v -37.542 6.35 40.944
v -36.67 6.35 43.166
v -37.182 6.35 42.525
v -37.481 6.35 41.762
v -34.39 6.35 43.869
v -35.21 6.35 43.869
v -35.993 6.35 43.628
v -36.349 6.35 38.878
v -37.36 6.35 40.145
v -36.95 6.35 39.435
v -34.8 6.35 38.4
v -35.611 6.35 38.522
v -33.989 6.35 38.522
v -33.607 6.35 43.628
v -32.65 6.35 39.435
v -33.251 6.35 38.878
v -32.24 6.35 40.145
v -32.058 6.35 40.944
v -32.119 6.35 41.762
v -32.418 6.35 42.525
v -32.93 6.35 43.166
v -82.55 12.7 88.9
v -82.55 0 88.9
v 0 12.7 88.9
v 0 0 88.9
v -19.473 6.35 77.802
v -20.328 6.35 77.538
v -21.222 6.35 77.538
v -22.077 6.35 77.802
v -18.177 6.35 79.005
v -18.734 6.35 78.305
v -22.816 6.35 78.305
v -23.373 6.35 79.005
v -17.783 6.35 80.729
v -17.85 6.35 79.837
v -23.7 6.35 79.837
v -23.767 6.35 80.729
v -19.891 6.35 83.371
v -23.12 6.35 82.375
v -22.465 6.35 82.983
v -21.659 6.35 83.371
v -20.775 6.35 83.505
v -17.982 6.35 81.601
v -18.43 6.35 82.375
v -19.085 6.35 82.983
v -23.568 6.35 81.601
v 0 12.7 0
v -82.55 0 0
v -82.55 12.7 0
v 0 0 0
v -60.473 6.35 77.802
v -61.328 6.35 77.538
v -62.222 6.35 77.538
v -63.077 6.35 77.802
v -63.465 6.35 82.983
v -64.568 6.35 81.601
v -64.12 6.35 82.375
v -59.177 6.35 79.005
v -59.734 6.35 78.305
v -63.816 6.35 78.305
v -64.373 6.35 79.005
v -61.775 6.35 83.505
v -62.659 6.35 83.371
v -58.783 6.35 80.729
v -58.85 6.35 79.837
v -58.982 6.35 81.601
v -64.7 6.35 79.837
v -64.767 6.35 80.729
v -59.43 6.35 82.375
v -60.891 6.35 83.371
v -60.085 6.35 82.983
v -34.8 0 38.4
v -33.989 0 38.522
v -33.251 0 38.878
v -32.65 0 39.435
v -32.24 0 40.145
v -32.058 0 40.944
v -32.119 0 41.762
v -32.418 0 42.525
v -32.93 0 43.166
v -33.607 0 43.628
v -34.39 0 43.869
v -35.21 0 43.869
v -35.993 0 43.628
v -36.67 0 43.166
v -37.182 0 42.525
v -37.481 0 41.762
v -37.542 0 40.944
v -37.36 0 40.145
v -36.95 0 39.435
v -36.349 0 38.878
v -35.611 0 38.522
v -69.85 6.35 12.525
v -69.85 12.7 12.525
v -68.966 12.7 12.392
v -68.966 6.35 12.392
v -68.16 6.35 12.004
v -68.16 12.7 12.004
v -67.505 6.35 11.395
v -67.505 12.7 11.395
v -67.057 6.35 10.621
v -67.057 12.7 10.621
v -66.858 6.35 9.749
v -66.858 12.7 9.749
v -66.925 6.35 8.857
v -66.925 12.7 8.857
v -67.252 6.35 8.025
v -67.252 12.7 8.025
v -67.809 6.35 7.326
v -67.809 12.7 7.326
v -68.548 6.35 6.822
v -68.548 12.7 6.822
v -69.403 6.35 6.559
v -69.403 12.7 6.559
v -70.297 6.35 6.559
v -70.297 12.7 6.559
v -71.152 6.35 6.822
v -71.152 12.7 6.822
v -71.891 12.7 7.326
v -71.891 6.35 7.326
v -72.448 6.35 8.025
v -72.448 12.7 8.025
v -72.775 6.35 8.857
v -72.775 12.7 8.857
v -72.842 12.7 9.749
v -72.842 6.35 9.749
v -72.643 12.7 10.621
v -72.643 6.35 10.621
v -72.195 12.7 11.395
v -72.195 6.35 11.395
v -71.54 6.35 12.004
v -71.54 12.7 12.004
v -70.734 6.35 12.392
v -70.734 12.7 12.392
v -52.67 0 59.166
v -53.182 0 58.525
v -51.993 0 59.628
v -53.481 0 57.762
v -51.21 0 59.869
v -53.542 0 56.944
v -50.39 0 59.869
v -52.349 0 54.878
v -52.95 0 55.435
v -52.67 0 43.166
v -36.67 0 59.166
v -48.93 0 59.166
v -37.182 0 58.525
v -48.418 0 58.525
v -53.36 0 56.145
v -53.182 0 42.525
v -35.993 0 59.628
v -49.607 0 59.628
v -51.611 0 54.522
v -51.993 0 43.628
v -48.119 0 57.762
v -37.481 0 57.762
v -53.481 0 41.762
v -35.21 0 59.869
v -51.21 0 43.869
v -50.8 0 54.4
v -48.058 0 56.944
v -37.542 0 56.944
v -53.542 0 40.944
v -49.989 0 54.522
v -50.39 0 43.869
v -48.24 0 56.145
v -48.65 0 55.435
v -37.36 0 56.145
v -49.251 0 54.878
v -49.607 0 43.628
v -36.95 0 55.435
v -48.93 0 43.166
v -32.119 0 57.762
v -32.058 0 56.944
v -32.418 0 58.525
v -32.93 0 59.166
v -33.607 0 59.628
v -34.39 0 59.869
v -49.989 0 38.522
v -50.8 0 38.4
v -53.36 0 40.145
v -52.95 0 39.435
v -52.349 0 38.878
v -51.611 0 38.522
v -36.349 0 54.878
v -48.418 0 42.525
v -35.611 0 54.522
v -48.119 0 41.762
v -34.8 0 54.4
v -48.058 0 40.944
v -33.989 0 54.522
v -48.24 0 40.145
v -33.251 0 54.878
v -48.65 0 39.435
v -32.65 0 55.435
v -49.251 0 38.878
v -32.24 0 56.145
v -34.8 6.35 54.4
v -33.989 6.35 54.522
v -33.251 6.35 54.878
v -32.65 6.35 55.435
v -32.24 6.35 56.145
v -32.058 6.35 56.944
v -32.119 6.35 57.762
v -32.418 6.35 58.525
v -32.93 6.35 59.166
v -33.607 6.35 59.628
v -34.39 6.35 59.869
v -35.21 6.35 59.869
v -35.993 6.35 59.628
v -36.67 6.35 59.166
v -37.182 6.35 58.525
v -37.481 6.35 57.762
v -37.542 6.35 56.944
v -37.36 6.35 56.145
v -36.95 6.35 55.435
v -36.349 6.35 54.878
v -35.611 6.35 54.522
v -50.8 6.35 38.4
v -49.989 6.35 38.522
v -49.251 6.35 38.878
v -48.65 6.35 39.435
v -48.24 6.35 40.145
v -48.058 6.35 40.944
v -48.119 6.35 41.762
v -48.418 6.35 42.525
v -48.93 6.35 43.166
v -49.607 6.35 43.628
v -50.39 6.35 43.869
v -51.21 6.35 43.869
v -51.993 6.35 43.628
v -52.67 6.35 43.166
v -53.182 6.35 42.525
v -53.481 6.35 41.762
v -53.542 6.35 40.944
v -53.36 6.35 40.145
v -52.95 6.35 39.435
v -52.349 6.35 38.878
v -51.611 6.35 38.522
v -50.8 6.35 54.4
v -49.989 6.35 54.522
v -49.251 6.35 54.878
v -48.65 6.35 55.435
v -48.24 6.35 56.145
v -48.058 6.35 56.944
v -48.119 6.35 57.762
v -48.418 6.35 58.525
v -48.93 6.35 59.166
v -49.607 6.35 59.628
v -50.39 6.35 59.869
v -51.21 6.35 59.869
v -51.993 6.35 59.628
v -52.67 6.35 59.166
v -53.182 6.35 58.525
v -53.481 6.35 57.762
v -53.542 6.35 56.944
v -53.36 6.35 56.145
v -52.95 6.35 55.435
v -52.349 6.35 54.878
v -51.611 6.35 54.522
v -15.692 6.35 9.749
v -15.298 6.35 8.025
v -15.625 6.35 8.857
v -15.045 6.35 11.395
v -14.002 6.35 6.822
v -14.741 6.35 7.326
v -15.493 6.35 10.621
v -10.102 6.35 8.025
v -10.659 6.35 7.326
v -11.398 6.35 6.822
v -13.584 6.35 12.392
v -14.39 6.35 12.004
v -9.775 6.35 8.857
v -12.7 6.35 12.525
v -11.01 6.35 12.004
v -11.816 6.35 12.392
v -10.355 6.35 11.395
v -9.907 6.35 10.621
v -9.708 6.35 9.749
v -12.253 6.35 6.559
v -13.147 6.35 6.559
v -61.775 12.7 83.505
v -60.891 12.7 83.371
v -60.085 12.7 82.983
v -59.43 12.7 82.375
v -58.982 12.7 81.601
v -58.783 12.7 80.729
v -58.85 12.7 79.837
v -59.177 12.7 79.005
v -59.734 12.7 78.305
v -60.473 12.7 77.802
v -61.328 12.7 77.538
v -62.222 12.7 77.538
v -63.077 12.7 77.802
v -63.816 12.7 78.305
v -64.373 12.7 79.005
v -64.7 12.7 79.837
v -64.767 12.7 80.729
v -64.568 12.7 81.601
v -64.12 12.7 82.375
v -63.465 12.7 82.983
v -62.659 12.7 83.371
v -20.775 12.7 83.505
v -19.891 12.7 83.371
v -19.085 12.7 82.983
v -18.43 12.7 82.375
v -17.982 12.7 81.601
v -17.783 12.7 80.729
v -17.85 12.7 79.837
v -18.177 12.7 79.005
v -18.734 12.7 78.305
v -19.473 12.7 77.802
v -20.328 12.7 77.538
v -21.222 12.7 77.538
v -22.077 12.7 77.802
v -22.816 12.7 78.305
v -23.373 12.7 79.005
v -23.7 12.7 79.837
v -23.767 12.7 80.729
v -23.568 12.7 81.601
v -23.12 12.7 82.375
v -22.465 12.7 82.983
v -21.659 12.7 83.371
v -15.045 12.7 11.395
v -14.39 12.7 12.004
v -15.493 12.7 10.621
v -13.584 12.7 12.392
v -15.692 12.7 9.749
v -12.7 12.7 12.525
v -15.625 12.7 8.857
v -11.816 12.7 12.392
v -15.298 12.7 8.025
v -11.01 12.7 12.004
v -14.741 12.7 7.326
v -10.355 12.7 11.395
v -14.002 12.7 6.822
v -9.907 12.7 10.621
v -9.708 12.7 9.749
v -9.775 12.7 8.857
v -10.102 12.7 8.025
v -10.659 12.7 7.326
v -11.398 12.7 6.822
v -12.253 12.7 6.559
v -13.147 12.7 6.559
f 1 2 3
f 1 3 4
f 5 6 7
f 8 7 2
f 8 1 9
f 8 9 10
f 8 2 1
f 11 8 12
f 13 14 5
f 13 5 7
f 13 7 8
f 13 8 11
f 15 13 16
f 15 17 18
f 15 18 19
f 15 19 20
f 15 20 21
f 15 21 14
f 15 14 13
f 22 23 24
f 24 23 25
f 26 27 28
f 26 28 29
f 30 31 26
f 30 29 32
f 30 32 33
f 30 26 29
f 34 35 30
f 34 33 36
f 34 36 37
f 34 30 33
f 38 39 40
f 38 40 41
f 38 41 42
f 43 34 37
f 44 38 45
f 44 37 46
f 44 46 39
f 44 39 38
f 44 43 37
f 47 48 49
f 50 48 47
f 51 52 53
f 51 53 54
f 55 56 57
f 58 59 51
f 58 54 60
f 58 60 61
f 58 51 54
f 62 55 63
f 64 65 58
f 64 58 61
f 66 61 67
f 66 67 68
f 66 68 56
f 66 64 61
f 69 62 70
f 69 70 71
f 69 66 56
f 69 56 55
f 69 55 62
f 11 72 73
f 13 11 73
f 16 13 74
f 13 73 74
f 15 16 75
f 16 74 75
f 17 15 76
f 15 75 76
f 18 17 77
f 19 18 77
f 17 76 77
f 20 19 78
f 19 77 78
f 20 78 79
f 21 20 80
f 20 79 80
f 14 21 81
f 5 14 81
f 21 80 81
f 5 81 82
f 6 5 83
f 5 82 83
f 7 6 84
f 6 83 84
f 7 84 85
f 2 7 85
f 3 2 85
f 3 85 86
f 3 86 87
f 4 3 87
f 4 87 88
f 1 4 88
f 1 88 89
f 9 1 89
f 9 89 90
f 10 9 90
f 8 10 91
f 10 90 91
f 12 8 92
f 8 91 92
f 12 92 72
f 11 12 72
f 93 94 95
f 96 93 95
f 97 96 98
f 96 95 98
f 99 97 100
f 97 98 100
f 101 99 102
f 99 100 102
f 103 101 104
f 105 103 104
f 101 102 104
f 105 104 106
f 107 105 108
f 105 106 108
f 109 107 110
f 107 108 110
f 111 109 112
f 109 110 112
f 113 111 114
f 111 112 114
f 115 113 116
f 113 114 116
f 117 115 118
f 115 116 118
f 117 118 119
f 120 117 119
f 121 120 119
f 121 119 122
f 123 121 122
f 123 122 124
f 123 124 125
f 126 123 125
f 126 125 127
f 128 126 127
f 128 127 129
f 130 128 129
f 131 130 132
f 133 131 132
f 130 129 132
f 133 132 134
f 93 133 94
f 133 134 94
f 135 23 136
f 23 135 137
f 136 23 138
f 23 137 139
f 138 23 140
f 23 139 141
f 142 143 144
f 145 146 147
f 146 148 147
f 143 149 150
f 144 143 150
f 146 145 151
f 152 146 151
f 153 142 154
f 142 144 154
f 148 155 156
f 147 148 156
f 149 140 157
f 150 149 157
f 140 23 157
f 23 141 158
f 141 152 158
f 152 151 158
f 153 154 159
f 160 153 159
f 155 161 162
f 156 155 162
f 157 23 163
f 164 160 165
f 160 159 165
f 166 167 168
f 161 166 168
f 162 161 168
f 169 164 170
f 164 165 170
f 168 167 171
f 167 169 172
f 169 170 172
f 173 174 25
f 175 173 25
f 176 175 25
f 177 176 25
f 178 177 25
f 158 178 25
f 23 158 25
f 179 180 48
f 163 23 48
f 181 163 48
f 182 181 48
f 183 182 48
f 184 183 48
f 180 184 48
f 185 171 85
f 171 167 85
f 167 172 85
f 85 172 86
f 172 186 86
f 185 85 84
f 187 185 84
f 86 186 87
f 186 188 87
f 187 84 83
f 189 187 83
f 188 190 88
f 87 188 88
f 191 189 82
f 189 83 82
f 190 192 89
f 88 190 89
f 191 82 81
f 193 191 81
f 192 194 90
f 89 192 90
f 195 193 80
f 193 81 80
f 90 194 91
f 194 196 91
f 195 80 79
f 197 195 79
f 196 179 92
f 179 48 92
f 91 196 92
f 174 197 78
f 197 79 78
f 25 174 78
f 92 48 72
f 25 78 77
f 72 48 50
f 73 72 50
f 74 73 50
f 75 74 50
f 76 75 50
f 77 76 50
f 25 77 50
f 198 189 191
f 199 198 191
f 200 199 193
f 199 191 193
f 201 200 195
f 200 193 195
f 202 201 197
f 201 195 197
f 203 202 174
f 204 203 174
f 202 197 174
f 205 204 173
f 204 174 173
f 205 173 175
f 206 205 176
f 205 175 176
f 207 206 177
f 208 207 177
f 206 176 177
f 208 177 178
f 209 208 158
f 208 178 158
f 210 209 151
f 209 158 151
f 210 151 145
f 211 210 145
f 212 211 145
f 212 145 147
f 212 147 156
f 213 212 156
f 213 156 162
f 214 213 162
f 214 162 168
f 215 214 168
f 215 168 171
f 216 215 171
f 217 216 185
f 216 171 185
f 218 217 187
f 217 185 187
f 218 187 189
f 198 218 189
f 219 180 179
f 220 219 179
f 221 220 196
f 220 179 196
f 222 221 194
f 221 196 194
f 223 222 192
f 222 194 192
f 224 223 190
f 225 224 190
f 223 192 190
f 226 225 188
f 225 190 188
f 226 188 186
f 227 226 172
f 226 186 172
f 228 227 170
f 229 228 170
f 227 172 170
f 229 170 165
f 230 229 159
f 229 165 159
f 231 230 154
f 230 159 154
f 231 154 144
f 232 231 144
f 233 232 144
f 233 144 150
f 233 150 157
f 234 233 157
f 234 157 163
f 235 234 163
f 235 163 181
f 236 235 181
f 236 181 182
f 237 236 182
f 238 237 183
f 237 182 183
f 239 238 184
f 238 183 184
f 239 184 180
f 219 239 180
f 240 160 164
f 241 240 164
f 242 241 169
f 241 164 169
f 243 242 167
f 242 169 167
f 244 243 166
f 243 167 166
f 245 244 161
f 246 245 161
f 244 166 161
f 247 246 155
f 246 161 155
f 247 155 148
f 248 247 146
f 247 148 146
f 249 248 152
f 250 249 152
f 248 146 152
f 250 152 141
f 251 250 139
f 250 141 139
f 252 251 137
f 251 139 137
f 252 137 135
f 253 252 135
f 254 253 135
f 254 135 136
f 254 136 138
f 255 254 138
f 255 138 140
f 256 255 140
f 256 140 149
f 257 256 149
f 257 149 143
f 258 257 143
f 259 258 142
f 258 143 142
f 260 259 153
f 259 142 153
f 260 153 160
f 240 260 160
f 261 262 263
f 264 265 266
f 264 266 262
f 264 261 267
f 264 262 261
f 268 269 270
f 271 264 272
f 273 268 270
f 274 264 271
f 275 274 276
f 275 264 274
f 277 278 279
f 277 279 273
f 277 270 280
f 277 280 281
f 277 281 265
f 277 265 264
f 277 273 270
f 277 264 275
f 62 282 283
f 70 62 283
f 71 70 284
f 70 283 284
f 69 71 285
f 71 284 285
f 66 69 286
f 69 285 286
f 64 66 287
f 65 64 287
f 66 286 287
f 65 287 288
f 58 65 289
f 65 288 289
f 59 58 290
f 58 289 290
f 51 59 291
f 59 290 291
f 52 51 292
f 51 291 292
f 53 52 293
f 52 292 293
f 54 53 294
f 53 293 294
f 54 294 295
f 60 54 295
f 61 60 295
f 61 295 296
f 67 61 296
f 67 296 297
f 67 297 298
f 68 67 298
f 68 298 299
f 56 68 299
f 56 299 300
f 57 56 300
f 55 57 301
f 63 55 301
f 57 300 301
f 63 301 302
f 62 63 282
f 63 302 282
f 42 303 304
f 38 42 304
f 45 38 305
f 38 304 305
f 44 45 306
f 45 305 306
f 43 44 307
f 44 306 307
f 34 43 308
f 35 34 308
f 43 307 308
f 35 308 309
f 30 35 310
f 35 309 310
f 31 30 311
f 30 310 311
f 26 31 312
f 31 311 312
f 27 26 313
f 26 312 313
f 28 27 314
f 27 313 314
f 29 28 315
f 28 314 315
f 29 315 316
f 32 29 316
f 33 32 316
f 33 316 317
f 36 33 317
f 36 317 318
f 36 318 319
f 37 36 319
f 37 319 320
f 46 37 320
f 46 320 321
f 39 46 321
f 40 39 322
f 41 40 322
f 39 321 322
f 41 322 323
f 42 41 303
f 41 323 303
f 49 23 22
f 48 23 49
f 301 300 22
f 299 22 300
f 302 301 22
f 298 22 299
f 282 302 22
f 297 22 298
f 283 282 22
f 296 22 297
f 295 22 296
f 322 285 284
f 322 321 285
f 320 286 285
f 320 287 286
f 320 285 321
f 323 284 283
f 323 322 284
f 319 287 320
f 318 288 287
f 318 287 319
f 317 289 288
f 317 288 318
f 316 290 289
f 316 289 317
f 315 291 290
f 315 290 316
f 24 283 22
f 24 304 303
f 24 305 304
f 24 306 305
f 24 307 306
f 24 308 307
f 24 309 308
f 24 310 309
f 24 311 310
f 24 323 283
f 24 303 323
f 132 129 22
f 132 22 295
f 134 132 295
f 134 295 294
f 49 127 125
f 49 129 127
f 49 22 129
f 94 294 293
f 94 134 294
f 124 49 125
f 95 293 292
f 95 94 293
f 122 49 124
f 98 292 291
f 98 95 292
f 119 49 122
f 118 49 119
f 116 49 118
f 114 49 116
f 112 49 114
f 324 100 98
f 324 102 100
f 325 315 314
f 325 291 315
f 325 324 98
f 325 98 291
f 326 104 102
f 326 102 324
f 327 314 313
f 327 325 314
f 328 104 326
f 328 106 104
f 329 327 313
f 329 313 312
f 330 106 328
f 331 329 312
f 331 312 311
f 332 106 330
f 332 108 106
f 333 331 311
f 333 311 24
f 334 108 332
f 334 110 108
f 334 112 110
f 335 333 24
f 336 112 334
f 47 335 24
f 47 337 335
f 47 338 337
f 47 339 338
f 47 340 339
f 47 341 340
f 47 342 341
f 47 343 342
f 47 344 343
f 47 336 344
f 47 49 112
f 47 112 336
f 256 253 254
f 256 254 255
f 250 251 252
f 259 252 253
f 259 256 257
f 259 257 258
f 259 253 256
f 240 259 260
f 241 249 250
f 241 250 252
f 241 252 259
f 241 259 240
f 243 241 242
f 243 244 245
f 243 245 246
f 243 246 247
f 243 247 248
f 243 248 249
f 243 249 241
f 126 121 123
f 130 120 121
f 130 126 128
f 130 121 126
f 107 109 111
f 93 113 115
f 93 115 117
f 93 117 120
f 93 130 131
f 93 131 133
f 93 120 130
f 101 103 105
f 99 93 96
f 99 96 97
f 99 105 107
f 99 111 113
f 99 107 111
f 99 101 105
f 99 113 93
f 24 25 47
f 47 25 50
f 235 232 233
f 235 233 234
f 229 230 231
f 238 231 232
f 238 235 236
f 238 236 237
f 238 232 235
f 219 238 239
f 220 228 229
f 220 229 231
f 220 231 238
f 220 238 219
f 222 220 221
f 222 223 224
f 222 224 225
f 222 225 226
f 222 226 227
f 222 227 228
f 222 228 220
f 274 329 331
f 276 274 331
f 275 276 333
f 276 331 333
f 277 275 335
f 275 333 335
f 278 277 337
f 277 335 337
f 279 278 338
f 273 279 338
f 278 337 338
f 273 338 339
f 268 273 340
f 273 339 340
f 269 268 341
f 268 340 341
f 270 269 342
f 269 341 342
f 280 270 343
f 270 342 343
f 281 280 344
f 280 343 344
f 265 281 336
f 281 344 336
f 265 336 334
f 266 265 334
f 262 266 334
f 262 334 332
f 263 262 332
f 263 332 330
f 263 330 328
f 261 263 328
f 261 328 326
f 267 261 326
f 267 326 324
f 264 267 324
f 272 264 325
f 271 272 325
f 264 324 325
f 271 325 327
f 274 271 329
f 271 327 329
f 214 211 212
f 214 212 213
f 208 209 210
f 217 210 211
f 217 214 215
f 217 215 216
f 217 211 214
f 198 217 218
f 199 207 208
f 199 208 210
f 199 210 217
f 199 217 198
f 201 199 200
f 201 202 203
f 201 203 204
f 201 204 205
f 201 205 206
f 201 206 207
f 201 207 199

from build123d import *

# Parameters (mm, degrees)
SKETCH1_W           = 82.55
SKETCH1_H           = 88.9
BOSS_EXTRUDE1_DEPTH = 12.7
SKETCH2_R           = 3
CUT_EXTRUDE1_DEPTH  = 6.35
SKETCH3_R           = 2.75
CUT_EXTRUDE2_DEPTH  = 6.35


with BuildPart() as part:
    # Sketch1 → Boss-Extrude1 (new body)
    with BuildSketch(Plane(origin=(0, 0, 0), x_dir=(1, 0, 0), z_dir=(0, 1, 0))):
        with Locations((-41.275, -44.45)):
            Rectangle(SKETCH1_W, SKETCH1_H)
    extrude(amount=BOSS_EXTRUDE1_DEPTH)

    # Sketch2 → Cut-Extrude1 (cut)
    with BuildSketch(Plane(origin=(0, 12.7, 0), x_dir=(1, 0, 0), z_dir=(0, 1, 0))):
        with Locations((-69.85, -9.525)):
            Circle(SKETCH2_R)
        with Locations((-12.7, -9.525)):
            Circle(SKETCH2_R)
        with Locations((-61.775, -80.504650473)):
            Circle(SKETCH2_R)
        with Locations((-20.775, -80.504650473)):
            Circle(SKETCH2_R)
    extrude(amount=-CUT_EXTRUDE1_DEPTH, mode=Mode.SUBTRACT)

    # Sketch3 → Cut-Extrude2 (cut)
    with BuildSketch(Plane.XZ):
        with Locations((-50.8, 57.15)):
            Circle(SKETCH3_R)
        with Locations((-34.8, 57.15)):
            Circle(SKETCH3_R)
        with Locations((-50.8, 41.15)):
            Circle(SKETCH3_R)
        with Locations((-34.8, 41.15)):
            Circle(SKETCH3_R)
    extrude(amount=-CUT_EXTRUDE2_DEPTH, mode=Mode.SUBTRACT)


solid = part.part
